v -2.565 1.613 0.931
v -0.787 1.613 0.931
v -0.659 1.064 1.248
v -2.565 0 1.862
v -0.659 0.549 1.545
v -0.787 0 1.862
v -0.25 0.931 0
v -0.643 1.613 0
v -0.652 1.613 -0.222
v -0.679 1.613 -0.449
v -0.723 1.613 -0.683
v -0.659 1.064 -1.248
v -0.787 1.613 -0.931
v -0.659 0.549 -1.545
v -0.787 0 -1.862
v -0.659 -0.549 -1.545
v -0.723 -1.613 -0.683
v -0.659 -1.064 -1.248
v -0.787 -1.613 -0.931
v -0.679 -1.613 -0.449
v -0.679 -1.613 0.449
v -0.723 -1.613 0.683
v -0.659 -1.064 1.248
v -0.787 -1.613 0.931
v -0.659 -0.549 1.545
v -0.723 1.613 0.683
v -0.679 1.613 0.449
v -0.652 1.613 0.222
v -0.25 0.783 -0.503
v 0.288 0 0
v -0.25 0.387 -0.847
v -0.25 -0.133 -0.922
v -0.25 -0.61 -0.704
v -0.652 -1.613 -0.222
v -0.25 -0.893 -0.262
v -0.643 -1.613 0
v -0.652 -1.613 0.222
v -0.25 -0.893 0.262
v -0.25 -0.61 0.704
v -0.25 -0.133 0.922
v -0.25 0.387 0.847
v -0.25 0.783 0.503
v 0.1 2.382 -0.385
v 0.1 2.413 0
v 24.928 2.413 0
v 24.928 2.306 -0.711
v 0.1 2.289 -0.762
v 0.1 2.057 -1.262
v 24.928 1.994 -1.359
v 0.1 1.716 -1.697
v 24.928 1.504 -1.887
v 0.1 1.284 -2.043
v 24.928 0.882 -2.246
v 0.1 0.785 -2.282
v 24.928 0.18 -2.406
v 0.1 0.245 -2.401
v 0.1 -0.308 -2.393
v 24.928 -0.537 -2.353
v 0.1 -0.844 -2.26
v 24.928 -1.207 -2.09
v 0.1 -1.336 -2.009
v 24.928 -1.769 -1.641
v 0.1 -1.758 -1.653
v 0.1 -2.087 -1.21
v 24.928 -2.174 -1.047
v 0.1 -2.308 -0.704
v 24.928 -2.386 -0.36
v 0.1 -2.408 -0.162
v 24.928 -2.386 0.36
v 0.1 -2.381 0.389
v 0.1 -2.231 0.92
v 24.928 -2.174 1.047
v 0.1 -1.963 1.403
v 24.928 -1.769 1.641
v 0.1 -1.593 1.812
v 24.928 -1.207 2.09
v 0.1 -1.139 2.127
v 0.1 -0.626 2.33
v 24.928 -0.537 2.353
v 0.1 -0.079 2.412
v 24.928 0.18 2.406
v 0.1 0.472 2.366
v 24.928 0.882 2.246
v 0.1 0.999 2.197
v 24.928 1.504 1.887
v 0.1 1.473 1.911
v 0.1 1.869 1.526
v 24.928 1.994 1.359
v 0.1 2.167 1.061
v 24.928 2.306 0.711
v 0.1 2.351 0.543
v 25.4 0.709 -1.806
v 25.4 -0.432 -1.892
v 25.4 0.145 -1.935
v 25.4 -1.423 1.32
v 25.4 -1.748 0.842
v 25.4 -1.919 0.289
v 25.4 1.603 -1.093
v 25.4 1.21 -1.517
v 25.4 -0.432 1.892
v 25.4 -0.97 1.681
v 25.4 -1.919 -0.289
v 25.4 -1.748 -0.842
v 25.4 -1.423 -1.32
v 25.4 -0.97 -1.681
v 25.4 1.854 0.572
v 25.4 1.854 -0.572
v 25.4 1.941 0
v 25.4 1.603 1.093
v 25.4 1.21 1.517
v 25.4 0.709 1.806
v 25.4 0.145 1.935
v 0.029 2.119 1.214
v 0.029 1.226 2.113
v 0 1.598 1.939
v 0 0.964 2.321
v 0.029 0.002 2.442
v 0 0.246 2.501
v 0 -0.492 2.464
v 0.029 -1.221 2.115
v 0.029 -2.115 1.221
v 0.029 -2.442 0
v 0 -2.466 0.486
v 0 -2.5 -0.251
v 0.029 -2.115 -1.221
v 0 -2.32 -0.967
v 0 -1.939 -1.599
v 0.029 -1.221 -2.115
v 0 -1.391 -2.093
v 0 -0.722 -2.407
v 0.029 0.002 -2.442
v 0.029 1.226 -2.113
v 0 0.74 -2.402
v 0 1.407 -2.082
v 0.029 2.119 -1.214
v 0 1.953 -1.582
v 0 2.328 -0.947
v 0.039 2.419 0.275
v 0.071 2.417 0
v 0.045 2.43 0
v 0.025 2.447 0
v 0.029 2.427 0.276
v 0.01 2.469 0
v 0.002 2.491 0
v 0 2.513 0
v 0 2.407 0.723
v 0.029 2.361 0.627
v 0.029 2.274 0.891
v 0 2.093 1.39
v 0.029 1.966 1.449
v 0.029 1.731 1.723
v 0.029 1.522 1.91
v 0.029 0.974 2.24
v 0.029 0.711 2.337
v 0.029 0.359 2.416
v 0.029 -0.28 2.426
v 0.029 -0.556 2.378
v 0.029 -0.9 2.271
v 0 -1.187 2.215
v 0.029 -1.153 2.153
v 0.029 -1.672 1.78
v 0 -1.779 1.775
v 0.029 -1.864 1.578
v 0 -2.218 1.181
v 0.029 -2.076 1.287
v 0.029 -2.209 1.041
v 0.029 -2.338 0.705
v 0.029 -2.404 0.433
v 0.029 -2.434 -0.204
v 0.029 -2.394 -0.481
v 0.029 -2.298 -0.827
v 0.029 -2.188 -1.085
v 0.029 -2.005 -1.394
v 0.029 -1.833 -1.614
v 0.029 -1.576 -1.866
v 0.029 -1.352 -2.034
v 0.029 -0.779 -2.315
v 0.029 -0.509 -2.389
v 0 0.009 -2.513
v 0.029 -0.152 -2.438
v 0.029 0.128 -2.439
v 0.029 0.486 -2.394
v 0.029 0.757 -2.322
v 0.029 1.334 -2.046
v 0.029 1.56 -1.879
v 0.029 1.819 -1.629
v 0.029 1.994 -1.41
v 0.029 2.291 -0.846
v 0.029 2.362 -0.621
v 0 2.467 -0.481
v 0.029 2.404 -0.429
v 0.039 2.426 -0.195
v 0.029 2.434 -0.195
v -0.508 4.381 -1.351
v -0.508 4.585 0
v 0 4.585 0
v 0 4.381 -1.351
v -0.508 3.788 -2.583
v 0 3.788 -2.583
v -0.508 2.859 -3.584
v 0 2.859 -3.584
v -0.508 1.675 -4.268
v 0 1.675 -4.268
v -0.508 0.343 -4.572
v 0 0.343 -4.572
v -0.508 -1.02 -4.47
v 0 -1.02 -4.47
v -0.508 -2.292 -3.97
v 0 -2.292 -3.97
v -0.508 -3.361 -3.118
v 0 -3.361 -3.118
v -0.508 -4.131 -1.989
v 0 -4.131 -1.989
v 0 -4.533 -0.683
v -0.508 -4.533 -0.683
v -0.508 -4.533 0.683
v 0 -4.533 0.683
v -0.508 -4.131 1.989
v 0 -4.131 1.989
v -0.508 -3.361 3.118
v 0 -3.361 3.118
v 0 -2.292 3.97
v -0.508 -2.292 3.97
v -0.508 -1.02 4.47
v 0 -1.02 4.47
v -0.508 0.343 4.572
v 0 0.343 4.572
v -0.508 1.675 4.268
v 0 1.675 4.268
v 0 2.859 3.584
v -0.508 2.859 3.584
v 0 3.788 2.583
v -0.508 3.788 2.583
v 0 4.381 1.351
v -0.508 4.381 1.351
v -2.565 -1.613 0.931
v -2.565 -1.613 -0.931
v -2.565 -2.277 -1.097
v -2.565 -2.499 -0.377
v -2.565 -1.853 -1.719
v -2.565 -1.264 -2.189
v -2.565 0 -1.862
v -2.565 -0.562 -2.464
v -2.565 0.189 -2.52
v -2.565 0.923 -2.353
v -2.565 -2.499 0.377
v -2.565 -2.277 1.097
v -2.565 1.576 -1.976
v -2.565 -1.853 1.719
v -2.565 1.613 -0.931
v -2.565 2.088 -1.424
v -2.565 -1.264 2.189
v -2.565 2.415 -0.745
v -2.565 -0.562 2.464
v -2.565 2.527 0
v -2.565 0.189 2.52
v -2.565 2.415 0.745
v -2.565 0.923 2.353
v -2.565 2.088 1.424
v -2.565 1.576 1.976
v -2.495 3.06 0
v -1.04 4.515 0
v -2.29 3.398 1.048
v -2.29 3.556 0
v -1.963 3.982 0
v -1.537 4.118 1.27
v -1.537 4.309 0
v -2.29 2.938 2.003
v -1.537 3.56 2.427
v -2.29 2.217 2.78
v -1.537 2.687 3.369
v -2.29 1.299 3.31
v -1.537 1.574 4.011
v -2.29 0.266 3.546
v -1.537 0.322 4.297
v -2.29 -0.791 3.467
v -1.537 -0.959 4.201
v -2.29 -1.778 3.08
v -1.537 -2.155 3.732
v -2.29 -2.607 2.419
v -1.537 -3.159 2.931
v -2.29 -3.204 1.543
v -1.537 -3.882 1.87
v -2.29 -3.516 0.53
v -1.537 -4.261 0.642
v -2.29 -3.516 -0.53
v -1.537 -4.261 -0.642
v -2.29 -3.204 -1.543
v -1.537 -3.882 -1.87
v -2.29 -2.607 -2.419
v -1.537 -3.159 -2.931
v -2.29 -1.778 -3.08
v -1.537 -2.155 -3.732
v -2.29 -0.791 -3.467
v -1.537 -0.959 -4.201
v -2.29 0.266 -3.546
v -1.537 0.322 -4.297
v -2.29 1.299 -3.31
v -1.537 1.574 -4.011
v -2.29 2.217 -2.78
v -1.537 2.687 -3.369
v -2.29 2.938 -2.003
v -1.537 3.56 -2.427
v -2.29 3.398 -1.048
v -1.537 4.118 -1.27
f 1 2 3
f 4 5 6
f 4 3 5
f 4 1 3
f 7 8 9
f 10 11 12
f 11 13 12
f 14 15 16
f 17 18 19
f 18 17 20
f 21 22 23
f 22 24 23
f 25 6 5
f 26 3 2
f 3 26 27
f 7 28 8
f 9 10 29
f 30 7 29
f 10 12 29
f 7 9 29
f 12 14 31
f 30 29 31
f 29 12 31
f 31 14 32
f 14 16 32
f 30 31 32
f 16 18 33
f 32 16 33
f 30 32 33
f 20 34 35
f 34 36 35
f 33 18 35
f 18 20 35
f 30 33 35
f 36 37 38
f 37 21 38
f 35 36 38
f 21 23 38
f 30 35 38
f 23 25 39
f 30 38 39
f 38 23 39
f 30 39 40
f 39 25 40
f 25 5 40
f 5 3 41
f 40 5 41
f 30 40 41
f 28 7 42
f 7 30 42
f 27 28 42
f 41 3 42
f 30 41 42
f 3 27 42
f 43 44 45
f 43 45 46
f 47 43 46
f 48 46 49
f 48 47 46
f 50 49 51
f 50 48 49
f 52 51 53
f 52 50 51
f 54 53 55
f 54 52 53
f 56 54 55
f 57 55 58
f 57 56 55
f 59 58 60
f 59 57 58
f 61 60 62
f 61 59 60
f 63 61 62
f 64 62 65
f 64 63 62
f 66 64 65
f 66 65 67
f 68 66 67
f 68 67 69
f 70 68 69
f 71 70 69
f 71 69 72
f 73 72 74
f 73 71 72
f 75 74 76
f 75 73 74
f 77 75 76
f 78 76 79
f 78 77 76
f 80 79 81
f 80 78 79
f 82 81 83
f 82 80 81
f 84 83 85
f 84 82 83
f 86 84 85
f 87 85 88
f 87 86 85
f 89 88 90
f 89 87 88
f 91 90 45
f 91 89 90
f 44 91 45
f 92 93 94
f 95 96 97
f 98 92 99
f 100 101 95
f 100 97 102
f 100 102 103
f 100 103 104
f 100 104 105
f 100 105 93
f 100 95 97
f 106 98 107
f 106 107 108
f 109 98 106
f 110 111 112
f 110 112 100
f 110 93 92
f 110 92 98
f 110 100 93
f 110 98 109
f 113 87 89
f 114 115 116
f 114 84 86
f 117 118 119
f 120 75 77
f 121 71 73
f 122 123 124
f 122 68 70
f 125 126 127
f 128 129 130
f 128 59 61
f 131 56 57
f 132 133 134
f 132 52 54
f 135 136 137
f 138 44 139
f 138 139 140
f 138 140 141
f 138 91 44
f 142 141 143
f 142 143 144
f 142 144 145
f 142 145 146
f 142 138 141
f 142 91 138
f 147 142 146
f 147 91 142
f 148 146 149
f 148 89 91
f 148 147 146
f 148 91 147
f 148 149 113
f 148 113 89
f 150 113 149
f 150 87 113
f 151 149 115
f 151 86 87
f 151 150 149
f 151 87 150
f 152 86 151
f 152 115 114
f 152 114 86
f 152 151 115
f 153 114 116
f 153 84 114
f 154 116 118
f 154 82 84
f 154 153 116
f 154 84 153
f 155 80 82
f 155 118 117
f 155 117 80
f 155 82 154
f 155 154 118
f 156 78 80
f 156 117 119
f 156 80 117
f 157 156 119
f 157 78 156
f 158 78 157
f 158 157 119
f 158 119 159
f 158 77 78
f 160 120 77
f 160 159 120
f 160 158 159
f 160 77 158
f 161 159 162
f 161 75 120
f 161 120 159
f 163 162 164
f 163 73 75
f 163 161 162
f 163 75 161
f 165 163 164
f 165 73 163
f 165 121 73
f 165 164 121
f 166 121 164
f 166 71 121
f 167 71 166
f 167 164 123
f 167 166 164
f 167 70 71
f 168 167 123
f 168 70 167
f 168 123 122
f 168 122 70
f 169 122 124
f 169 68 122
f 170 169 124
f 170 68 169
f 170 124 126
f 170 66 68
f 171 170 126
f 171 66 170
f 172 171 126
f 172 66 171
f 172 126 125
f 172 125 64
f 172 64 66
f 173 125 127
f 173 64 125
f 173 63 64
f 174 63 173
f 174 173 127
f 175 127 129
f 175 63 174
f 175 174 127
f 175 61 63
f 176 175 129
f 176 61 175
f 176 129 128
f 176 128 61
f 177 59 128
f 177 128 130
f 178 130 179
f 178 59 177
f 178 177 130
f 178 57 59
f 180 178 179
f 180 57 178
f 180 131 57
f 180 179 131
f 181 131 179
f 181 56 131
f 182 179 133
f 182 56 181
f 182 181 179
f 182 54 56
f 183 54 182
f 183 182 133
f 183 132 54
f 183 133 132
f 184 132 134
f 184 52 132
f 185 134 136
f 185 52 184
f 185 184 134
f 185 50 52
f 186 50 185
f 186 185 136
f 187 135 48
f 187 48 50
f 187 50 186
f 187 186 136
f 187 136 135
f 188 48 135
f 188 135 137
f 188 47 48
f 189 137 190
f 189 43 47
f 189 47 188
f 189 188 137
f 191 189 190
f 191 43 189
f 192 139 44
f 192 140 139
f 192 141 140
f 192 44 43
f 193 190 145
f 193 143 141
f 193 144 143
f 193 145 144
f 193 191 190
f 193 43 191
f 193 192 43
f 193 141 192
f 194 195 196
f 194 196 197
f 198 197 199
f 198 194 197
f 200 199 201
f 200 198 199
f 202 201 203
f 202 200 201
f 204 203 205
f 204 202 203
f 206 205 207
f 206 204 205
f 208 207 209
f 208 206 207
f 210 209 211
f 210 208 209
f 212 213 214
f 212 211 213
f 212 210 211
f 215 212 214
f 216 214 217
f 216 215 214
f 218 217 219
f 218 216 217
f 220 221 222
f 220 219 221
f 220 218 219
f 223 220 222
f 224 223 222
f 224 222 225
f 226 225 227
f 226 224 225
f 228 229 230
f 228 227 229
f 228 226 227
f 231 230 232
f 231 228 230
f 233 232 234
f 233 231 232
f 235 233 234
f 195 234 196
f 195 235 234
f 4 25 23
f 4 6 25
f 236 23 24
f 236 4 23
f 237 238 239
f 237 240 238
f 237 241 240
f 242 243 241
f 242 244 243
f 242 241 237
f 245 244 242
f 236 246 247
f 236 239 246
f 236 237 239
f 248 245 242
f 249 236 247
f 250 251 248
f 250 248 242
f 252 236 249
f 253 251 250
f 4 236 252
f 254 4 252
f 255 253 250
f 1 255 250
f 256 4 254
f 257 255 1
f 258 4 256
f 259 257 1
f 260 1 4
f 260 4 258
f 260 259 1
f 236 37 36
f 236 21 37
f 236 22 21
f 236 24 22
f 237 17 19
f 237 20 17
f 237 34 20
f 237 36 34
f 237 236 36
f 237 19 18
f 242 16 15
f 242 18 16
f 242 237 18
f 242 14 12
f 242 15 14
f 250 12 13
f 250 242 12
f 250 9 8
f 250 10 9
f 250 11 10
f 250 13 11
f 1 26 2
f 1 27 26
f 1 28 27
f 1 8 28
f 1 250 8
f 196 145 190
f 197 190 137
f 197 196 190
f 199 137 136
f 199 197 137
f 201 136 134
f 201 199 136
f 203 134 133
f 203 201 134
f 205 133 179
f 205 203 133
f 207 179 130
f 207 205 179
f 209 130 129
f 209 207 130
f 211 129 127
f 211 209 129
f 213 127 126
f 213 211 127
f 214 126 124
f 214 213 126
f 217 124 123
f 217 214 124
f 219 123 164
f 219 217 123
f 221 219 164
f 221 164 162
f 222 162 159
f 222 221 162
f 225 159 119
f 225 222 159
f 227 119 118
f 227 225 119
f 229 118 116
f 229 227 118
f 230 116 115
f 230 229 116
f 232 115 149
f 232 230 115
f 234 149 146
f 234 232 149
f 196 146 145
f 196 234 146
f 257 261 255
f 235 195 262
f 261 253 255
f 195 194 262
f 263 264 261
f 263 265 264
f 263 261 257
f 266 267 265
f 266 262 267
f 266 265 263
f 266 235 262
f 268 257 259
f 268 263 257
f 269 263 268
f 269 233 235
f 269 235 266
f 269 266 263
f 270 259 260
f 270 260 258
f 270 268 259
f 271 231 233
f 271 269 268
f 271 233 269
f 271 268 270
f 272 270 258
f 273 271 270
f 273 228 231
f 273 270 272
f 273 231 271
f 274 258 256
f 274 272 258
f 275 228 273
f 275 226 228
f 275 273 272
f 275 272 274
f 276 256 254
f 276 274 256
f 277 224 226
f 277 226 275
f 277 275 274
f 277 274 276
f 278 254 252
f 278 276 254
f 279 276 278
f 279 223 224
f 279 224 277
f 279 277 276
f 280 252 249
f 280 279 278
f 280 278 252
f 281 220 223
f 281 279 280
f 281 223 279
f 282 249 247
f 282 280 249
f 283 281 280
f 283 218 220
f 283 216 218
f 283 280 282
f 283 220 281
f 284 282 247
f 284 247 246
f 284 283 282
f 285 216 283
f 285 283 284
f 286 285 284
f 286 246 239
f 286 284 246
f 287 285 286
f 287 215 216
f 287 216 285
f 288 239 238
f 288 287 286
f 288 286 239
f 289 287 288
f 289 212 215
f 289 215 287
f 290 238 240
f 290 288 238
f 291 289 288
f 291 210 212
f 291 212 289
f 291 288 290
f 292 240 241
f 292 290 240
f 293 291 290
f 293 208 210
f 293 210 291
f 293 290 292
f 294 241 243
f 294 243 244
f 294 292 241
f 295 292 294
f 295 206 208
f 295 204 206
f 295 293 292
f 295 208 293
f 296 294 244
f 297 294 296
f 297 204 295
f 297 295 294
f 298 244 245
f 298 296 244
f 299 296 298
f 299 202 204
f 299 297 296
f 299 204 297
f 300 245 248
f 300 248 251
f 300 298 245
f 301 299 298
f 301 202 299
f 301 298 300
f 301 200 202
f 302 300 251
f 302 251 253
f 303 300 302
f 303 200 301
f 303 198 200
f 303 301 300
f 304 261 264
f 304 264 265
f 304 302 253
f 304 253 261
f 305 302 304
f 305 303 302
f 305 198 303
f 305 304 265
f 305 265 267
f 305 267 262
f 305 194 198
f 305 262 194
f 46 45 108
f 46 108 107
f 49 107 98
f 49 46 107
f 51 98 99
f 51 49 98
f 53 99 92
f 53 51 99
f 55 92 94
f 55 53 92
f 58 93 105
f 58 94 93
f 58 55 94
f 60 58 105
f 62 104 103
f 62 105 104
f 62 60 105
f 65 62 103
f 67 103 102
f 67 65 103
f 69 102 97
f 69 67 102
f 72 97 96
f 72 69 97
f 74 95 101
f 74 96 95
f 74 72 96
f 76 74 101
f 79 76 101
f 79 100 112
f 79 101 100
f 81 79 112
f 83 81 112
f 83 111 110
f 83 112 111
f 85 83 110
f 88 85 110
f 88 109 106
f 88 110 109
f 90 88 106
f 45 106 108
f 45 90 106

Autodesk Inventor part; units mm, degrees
ref_plane "YZ Plane" through (0, 0, 0) normal (1, 0, 0) x (0, 1, 0)
ref_plane "XZ Plane" through (0, 0, 0) normal (0, 1, 0) x (-1, 0, 0)
sketch "Sketch1" plane through (0, 0, 0) normal (0, 0, 1) x (1, 0, 0)
  line L0 (0.2879, 0) -> (25.4, 0)
  line L1 (25.4, 0) -> (25.4, 2.413)
  line L2 (25.4, 2.413) -> (2.1084, 2.413)
  line L3 (2.1084, 2.413) -> (0.0001, 2.413)
  line L4 (0.0001, 2.413) -> (0, 2.413)
  line L5 (0, 2.413) -> (0, 4.5847)
  line L6 (0, 4.5847) -> (-2.5654, 4.5847)
  line L7 (-2.5654, 4.5847) -> (-2.5654, 1.8624)
  line L8 (-2.5654, 1.8624) -> (-0.7874, 1.8624)
  line L9 (-0.7874, 1.8624) -> (0.2879, 0)
  line L10 (-8.1585, 0) -> (30.9931, 0) projected
  line L11 (0, -0.9169) -> (0, 5.5016) projected
  line L12 (2.1084, 2.413) -> (0, 2.413) construction
  dimension "d1" = 23.2916
  dimension "d2" = 2.1083
  dimension "d3" = 2.5654
  dimension "d4" = 1.778
  dimension "d5" = 60
  dimension "d6" = 4.826
  dimension "d7" = 4.826
  dimension "d8" = 3.7248
  dimension "d9" = 9.1694
  dimension "d26" = 25.4
revolve "Body" add sketch "Sketch1" angle 360 about axis through (0.2879, 0, 0) along (1, 0, 0) contours L9 L11 L3 L2 L1 L0 | L9 L8 L7 L6 L5 L11
sketch "Sketch2" plane through (-2.5654, 0, 0) normal (-1, 0, 0) x (0, 0, 1)
  circle A0 centre (0, 0) radius 1.8624 projected
  line L0 (0, -6.4186) -> (0, 6.4186) projected
  line L1 (-6.4186, 0) -> (6.4186, 0) projected
  line L2 (1.8624, 0) -> (0.9312, -1.6129)
  line L3 (0.9312, -1.6129) -> (-0.9312, -1.6129)
  line L4 (-0.9312, -1.6129) -> (-1.8624, 0)
  line L5 (-1.8624, 0) -> (-0.9312, 1.6129)
  line L6 (-0.9312, 1.6129) -> (0.9312, 1.6129)
  line L7 (0.9312, 1.6129) -> (1.8624, 0)
extrude "Slot" add sketch "Sketch2" against normal up to next contours L7 A0 | A0 L2 | L6 L0 A0 | A0 L0 L3 | L0 L6 A0 | A0 L3 L0 | L4 A0 | A0 L5
fillet "Fillet1" radius 2.0574 1 edges at (-2.5654, -4.5847, 0)
thread "Thread" size "10-32 UNF" class "2A" standard "ANSI Unified Screw Threads" length 23.2916
chamfer "Chamfer1" distance 0.4724 distance2 0.4724 1 edges at (25.4, -2.413, 0) measured on face at (25.4, 0.9527, 0.2826)
ref_plane "Work Plane1" through (29, 0, 0) normal (0, -1, 0) x (1, 0, 0)
fillet "Fillet2" radius 0.1 1 edges at (0.0001, -2.413, 0)
equation "\"d30\" = R"
equation "\"d17\" = RR"
equation "\"d13\" = GEL"
equation "\"d15\" = -0.5 * SPD + 0.5 * GD"
equation "\"d16\" = GUL"
equation "\"d1\" = GEL"
equation "\"d3\" = KOH"
equation "\"d4\" = INTI"
equation "\"d6\" = GD"
equation "\"d7\" = BDM"
equation "\"d8\" = 1.1547 * SW"
equation "\"d9\" = KOD"
equation "\"d26\" = NLG"
equation "\"GD\" = NND"
equation "\"NLG\" = 25.4"
equation "\"GEL\" = 23.2916"
equation "\"KOD\" = 9.1694"
equation "\"KOH\" = 2.5654"
equation "\"INTI\" = 1.778"
equation "\"GAL\" = 2.1082"
equation "\"GUL\" = 0.47244"
equation "\"BDM\" = NND"
equation "\"SW\" = 3.2258"
equation "\"RR\" = 2.0574"
equation "\"SPD\" = 3.88112"
equation "\"R\" = 0.1"
equation "\"TOA\" = 30deg"
equation "\"GD1\" = SPD"
equation "\"THREADDIA\" = 4.826"
equation "\"KOH1\" = 0.508"
equation "\"NND\" = 4.826"
equation "\"E0\" = 3.72593"
properties part number "ANSI B18.3 - No. 10-32 - 1, HSBHCSI" material "Steel, Mild"
